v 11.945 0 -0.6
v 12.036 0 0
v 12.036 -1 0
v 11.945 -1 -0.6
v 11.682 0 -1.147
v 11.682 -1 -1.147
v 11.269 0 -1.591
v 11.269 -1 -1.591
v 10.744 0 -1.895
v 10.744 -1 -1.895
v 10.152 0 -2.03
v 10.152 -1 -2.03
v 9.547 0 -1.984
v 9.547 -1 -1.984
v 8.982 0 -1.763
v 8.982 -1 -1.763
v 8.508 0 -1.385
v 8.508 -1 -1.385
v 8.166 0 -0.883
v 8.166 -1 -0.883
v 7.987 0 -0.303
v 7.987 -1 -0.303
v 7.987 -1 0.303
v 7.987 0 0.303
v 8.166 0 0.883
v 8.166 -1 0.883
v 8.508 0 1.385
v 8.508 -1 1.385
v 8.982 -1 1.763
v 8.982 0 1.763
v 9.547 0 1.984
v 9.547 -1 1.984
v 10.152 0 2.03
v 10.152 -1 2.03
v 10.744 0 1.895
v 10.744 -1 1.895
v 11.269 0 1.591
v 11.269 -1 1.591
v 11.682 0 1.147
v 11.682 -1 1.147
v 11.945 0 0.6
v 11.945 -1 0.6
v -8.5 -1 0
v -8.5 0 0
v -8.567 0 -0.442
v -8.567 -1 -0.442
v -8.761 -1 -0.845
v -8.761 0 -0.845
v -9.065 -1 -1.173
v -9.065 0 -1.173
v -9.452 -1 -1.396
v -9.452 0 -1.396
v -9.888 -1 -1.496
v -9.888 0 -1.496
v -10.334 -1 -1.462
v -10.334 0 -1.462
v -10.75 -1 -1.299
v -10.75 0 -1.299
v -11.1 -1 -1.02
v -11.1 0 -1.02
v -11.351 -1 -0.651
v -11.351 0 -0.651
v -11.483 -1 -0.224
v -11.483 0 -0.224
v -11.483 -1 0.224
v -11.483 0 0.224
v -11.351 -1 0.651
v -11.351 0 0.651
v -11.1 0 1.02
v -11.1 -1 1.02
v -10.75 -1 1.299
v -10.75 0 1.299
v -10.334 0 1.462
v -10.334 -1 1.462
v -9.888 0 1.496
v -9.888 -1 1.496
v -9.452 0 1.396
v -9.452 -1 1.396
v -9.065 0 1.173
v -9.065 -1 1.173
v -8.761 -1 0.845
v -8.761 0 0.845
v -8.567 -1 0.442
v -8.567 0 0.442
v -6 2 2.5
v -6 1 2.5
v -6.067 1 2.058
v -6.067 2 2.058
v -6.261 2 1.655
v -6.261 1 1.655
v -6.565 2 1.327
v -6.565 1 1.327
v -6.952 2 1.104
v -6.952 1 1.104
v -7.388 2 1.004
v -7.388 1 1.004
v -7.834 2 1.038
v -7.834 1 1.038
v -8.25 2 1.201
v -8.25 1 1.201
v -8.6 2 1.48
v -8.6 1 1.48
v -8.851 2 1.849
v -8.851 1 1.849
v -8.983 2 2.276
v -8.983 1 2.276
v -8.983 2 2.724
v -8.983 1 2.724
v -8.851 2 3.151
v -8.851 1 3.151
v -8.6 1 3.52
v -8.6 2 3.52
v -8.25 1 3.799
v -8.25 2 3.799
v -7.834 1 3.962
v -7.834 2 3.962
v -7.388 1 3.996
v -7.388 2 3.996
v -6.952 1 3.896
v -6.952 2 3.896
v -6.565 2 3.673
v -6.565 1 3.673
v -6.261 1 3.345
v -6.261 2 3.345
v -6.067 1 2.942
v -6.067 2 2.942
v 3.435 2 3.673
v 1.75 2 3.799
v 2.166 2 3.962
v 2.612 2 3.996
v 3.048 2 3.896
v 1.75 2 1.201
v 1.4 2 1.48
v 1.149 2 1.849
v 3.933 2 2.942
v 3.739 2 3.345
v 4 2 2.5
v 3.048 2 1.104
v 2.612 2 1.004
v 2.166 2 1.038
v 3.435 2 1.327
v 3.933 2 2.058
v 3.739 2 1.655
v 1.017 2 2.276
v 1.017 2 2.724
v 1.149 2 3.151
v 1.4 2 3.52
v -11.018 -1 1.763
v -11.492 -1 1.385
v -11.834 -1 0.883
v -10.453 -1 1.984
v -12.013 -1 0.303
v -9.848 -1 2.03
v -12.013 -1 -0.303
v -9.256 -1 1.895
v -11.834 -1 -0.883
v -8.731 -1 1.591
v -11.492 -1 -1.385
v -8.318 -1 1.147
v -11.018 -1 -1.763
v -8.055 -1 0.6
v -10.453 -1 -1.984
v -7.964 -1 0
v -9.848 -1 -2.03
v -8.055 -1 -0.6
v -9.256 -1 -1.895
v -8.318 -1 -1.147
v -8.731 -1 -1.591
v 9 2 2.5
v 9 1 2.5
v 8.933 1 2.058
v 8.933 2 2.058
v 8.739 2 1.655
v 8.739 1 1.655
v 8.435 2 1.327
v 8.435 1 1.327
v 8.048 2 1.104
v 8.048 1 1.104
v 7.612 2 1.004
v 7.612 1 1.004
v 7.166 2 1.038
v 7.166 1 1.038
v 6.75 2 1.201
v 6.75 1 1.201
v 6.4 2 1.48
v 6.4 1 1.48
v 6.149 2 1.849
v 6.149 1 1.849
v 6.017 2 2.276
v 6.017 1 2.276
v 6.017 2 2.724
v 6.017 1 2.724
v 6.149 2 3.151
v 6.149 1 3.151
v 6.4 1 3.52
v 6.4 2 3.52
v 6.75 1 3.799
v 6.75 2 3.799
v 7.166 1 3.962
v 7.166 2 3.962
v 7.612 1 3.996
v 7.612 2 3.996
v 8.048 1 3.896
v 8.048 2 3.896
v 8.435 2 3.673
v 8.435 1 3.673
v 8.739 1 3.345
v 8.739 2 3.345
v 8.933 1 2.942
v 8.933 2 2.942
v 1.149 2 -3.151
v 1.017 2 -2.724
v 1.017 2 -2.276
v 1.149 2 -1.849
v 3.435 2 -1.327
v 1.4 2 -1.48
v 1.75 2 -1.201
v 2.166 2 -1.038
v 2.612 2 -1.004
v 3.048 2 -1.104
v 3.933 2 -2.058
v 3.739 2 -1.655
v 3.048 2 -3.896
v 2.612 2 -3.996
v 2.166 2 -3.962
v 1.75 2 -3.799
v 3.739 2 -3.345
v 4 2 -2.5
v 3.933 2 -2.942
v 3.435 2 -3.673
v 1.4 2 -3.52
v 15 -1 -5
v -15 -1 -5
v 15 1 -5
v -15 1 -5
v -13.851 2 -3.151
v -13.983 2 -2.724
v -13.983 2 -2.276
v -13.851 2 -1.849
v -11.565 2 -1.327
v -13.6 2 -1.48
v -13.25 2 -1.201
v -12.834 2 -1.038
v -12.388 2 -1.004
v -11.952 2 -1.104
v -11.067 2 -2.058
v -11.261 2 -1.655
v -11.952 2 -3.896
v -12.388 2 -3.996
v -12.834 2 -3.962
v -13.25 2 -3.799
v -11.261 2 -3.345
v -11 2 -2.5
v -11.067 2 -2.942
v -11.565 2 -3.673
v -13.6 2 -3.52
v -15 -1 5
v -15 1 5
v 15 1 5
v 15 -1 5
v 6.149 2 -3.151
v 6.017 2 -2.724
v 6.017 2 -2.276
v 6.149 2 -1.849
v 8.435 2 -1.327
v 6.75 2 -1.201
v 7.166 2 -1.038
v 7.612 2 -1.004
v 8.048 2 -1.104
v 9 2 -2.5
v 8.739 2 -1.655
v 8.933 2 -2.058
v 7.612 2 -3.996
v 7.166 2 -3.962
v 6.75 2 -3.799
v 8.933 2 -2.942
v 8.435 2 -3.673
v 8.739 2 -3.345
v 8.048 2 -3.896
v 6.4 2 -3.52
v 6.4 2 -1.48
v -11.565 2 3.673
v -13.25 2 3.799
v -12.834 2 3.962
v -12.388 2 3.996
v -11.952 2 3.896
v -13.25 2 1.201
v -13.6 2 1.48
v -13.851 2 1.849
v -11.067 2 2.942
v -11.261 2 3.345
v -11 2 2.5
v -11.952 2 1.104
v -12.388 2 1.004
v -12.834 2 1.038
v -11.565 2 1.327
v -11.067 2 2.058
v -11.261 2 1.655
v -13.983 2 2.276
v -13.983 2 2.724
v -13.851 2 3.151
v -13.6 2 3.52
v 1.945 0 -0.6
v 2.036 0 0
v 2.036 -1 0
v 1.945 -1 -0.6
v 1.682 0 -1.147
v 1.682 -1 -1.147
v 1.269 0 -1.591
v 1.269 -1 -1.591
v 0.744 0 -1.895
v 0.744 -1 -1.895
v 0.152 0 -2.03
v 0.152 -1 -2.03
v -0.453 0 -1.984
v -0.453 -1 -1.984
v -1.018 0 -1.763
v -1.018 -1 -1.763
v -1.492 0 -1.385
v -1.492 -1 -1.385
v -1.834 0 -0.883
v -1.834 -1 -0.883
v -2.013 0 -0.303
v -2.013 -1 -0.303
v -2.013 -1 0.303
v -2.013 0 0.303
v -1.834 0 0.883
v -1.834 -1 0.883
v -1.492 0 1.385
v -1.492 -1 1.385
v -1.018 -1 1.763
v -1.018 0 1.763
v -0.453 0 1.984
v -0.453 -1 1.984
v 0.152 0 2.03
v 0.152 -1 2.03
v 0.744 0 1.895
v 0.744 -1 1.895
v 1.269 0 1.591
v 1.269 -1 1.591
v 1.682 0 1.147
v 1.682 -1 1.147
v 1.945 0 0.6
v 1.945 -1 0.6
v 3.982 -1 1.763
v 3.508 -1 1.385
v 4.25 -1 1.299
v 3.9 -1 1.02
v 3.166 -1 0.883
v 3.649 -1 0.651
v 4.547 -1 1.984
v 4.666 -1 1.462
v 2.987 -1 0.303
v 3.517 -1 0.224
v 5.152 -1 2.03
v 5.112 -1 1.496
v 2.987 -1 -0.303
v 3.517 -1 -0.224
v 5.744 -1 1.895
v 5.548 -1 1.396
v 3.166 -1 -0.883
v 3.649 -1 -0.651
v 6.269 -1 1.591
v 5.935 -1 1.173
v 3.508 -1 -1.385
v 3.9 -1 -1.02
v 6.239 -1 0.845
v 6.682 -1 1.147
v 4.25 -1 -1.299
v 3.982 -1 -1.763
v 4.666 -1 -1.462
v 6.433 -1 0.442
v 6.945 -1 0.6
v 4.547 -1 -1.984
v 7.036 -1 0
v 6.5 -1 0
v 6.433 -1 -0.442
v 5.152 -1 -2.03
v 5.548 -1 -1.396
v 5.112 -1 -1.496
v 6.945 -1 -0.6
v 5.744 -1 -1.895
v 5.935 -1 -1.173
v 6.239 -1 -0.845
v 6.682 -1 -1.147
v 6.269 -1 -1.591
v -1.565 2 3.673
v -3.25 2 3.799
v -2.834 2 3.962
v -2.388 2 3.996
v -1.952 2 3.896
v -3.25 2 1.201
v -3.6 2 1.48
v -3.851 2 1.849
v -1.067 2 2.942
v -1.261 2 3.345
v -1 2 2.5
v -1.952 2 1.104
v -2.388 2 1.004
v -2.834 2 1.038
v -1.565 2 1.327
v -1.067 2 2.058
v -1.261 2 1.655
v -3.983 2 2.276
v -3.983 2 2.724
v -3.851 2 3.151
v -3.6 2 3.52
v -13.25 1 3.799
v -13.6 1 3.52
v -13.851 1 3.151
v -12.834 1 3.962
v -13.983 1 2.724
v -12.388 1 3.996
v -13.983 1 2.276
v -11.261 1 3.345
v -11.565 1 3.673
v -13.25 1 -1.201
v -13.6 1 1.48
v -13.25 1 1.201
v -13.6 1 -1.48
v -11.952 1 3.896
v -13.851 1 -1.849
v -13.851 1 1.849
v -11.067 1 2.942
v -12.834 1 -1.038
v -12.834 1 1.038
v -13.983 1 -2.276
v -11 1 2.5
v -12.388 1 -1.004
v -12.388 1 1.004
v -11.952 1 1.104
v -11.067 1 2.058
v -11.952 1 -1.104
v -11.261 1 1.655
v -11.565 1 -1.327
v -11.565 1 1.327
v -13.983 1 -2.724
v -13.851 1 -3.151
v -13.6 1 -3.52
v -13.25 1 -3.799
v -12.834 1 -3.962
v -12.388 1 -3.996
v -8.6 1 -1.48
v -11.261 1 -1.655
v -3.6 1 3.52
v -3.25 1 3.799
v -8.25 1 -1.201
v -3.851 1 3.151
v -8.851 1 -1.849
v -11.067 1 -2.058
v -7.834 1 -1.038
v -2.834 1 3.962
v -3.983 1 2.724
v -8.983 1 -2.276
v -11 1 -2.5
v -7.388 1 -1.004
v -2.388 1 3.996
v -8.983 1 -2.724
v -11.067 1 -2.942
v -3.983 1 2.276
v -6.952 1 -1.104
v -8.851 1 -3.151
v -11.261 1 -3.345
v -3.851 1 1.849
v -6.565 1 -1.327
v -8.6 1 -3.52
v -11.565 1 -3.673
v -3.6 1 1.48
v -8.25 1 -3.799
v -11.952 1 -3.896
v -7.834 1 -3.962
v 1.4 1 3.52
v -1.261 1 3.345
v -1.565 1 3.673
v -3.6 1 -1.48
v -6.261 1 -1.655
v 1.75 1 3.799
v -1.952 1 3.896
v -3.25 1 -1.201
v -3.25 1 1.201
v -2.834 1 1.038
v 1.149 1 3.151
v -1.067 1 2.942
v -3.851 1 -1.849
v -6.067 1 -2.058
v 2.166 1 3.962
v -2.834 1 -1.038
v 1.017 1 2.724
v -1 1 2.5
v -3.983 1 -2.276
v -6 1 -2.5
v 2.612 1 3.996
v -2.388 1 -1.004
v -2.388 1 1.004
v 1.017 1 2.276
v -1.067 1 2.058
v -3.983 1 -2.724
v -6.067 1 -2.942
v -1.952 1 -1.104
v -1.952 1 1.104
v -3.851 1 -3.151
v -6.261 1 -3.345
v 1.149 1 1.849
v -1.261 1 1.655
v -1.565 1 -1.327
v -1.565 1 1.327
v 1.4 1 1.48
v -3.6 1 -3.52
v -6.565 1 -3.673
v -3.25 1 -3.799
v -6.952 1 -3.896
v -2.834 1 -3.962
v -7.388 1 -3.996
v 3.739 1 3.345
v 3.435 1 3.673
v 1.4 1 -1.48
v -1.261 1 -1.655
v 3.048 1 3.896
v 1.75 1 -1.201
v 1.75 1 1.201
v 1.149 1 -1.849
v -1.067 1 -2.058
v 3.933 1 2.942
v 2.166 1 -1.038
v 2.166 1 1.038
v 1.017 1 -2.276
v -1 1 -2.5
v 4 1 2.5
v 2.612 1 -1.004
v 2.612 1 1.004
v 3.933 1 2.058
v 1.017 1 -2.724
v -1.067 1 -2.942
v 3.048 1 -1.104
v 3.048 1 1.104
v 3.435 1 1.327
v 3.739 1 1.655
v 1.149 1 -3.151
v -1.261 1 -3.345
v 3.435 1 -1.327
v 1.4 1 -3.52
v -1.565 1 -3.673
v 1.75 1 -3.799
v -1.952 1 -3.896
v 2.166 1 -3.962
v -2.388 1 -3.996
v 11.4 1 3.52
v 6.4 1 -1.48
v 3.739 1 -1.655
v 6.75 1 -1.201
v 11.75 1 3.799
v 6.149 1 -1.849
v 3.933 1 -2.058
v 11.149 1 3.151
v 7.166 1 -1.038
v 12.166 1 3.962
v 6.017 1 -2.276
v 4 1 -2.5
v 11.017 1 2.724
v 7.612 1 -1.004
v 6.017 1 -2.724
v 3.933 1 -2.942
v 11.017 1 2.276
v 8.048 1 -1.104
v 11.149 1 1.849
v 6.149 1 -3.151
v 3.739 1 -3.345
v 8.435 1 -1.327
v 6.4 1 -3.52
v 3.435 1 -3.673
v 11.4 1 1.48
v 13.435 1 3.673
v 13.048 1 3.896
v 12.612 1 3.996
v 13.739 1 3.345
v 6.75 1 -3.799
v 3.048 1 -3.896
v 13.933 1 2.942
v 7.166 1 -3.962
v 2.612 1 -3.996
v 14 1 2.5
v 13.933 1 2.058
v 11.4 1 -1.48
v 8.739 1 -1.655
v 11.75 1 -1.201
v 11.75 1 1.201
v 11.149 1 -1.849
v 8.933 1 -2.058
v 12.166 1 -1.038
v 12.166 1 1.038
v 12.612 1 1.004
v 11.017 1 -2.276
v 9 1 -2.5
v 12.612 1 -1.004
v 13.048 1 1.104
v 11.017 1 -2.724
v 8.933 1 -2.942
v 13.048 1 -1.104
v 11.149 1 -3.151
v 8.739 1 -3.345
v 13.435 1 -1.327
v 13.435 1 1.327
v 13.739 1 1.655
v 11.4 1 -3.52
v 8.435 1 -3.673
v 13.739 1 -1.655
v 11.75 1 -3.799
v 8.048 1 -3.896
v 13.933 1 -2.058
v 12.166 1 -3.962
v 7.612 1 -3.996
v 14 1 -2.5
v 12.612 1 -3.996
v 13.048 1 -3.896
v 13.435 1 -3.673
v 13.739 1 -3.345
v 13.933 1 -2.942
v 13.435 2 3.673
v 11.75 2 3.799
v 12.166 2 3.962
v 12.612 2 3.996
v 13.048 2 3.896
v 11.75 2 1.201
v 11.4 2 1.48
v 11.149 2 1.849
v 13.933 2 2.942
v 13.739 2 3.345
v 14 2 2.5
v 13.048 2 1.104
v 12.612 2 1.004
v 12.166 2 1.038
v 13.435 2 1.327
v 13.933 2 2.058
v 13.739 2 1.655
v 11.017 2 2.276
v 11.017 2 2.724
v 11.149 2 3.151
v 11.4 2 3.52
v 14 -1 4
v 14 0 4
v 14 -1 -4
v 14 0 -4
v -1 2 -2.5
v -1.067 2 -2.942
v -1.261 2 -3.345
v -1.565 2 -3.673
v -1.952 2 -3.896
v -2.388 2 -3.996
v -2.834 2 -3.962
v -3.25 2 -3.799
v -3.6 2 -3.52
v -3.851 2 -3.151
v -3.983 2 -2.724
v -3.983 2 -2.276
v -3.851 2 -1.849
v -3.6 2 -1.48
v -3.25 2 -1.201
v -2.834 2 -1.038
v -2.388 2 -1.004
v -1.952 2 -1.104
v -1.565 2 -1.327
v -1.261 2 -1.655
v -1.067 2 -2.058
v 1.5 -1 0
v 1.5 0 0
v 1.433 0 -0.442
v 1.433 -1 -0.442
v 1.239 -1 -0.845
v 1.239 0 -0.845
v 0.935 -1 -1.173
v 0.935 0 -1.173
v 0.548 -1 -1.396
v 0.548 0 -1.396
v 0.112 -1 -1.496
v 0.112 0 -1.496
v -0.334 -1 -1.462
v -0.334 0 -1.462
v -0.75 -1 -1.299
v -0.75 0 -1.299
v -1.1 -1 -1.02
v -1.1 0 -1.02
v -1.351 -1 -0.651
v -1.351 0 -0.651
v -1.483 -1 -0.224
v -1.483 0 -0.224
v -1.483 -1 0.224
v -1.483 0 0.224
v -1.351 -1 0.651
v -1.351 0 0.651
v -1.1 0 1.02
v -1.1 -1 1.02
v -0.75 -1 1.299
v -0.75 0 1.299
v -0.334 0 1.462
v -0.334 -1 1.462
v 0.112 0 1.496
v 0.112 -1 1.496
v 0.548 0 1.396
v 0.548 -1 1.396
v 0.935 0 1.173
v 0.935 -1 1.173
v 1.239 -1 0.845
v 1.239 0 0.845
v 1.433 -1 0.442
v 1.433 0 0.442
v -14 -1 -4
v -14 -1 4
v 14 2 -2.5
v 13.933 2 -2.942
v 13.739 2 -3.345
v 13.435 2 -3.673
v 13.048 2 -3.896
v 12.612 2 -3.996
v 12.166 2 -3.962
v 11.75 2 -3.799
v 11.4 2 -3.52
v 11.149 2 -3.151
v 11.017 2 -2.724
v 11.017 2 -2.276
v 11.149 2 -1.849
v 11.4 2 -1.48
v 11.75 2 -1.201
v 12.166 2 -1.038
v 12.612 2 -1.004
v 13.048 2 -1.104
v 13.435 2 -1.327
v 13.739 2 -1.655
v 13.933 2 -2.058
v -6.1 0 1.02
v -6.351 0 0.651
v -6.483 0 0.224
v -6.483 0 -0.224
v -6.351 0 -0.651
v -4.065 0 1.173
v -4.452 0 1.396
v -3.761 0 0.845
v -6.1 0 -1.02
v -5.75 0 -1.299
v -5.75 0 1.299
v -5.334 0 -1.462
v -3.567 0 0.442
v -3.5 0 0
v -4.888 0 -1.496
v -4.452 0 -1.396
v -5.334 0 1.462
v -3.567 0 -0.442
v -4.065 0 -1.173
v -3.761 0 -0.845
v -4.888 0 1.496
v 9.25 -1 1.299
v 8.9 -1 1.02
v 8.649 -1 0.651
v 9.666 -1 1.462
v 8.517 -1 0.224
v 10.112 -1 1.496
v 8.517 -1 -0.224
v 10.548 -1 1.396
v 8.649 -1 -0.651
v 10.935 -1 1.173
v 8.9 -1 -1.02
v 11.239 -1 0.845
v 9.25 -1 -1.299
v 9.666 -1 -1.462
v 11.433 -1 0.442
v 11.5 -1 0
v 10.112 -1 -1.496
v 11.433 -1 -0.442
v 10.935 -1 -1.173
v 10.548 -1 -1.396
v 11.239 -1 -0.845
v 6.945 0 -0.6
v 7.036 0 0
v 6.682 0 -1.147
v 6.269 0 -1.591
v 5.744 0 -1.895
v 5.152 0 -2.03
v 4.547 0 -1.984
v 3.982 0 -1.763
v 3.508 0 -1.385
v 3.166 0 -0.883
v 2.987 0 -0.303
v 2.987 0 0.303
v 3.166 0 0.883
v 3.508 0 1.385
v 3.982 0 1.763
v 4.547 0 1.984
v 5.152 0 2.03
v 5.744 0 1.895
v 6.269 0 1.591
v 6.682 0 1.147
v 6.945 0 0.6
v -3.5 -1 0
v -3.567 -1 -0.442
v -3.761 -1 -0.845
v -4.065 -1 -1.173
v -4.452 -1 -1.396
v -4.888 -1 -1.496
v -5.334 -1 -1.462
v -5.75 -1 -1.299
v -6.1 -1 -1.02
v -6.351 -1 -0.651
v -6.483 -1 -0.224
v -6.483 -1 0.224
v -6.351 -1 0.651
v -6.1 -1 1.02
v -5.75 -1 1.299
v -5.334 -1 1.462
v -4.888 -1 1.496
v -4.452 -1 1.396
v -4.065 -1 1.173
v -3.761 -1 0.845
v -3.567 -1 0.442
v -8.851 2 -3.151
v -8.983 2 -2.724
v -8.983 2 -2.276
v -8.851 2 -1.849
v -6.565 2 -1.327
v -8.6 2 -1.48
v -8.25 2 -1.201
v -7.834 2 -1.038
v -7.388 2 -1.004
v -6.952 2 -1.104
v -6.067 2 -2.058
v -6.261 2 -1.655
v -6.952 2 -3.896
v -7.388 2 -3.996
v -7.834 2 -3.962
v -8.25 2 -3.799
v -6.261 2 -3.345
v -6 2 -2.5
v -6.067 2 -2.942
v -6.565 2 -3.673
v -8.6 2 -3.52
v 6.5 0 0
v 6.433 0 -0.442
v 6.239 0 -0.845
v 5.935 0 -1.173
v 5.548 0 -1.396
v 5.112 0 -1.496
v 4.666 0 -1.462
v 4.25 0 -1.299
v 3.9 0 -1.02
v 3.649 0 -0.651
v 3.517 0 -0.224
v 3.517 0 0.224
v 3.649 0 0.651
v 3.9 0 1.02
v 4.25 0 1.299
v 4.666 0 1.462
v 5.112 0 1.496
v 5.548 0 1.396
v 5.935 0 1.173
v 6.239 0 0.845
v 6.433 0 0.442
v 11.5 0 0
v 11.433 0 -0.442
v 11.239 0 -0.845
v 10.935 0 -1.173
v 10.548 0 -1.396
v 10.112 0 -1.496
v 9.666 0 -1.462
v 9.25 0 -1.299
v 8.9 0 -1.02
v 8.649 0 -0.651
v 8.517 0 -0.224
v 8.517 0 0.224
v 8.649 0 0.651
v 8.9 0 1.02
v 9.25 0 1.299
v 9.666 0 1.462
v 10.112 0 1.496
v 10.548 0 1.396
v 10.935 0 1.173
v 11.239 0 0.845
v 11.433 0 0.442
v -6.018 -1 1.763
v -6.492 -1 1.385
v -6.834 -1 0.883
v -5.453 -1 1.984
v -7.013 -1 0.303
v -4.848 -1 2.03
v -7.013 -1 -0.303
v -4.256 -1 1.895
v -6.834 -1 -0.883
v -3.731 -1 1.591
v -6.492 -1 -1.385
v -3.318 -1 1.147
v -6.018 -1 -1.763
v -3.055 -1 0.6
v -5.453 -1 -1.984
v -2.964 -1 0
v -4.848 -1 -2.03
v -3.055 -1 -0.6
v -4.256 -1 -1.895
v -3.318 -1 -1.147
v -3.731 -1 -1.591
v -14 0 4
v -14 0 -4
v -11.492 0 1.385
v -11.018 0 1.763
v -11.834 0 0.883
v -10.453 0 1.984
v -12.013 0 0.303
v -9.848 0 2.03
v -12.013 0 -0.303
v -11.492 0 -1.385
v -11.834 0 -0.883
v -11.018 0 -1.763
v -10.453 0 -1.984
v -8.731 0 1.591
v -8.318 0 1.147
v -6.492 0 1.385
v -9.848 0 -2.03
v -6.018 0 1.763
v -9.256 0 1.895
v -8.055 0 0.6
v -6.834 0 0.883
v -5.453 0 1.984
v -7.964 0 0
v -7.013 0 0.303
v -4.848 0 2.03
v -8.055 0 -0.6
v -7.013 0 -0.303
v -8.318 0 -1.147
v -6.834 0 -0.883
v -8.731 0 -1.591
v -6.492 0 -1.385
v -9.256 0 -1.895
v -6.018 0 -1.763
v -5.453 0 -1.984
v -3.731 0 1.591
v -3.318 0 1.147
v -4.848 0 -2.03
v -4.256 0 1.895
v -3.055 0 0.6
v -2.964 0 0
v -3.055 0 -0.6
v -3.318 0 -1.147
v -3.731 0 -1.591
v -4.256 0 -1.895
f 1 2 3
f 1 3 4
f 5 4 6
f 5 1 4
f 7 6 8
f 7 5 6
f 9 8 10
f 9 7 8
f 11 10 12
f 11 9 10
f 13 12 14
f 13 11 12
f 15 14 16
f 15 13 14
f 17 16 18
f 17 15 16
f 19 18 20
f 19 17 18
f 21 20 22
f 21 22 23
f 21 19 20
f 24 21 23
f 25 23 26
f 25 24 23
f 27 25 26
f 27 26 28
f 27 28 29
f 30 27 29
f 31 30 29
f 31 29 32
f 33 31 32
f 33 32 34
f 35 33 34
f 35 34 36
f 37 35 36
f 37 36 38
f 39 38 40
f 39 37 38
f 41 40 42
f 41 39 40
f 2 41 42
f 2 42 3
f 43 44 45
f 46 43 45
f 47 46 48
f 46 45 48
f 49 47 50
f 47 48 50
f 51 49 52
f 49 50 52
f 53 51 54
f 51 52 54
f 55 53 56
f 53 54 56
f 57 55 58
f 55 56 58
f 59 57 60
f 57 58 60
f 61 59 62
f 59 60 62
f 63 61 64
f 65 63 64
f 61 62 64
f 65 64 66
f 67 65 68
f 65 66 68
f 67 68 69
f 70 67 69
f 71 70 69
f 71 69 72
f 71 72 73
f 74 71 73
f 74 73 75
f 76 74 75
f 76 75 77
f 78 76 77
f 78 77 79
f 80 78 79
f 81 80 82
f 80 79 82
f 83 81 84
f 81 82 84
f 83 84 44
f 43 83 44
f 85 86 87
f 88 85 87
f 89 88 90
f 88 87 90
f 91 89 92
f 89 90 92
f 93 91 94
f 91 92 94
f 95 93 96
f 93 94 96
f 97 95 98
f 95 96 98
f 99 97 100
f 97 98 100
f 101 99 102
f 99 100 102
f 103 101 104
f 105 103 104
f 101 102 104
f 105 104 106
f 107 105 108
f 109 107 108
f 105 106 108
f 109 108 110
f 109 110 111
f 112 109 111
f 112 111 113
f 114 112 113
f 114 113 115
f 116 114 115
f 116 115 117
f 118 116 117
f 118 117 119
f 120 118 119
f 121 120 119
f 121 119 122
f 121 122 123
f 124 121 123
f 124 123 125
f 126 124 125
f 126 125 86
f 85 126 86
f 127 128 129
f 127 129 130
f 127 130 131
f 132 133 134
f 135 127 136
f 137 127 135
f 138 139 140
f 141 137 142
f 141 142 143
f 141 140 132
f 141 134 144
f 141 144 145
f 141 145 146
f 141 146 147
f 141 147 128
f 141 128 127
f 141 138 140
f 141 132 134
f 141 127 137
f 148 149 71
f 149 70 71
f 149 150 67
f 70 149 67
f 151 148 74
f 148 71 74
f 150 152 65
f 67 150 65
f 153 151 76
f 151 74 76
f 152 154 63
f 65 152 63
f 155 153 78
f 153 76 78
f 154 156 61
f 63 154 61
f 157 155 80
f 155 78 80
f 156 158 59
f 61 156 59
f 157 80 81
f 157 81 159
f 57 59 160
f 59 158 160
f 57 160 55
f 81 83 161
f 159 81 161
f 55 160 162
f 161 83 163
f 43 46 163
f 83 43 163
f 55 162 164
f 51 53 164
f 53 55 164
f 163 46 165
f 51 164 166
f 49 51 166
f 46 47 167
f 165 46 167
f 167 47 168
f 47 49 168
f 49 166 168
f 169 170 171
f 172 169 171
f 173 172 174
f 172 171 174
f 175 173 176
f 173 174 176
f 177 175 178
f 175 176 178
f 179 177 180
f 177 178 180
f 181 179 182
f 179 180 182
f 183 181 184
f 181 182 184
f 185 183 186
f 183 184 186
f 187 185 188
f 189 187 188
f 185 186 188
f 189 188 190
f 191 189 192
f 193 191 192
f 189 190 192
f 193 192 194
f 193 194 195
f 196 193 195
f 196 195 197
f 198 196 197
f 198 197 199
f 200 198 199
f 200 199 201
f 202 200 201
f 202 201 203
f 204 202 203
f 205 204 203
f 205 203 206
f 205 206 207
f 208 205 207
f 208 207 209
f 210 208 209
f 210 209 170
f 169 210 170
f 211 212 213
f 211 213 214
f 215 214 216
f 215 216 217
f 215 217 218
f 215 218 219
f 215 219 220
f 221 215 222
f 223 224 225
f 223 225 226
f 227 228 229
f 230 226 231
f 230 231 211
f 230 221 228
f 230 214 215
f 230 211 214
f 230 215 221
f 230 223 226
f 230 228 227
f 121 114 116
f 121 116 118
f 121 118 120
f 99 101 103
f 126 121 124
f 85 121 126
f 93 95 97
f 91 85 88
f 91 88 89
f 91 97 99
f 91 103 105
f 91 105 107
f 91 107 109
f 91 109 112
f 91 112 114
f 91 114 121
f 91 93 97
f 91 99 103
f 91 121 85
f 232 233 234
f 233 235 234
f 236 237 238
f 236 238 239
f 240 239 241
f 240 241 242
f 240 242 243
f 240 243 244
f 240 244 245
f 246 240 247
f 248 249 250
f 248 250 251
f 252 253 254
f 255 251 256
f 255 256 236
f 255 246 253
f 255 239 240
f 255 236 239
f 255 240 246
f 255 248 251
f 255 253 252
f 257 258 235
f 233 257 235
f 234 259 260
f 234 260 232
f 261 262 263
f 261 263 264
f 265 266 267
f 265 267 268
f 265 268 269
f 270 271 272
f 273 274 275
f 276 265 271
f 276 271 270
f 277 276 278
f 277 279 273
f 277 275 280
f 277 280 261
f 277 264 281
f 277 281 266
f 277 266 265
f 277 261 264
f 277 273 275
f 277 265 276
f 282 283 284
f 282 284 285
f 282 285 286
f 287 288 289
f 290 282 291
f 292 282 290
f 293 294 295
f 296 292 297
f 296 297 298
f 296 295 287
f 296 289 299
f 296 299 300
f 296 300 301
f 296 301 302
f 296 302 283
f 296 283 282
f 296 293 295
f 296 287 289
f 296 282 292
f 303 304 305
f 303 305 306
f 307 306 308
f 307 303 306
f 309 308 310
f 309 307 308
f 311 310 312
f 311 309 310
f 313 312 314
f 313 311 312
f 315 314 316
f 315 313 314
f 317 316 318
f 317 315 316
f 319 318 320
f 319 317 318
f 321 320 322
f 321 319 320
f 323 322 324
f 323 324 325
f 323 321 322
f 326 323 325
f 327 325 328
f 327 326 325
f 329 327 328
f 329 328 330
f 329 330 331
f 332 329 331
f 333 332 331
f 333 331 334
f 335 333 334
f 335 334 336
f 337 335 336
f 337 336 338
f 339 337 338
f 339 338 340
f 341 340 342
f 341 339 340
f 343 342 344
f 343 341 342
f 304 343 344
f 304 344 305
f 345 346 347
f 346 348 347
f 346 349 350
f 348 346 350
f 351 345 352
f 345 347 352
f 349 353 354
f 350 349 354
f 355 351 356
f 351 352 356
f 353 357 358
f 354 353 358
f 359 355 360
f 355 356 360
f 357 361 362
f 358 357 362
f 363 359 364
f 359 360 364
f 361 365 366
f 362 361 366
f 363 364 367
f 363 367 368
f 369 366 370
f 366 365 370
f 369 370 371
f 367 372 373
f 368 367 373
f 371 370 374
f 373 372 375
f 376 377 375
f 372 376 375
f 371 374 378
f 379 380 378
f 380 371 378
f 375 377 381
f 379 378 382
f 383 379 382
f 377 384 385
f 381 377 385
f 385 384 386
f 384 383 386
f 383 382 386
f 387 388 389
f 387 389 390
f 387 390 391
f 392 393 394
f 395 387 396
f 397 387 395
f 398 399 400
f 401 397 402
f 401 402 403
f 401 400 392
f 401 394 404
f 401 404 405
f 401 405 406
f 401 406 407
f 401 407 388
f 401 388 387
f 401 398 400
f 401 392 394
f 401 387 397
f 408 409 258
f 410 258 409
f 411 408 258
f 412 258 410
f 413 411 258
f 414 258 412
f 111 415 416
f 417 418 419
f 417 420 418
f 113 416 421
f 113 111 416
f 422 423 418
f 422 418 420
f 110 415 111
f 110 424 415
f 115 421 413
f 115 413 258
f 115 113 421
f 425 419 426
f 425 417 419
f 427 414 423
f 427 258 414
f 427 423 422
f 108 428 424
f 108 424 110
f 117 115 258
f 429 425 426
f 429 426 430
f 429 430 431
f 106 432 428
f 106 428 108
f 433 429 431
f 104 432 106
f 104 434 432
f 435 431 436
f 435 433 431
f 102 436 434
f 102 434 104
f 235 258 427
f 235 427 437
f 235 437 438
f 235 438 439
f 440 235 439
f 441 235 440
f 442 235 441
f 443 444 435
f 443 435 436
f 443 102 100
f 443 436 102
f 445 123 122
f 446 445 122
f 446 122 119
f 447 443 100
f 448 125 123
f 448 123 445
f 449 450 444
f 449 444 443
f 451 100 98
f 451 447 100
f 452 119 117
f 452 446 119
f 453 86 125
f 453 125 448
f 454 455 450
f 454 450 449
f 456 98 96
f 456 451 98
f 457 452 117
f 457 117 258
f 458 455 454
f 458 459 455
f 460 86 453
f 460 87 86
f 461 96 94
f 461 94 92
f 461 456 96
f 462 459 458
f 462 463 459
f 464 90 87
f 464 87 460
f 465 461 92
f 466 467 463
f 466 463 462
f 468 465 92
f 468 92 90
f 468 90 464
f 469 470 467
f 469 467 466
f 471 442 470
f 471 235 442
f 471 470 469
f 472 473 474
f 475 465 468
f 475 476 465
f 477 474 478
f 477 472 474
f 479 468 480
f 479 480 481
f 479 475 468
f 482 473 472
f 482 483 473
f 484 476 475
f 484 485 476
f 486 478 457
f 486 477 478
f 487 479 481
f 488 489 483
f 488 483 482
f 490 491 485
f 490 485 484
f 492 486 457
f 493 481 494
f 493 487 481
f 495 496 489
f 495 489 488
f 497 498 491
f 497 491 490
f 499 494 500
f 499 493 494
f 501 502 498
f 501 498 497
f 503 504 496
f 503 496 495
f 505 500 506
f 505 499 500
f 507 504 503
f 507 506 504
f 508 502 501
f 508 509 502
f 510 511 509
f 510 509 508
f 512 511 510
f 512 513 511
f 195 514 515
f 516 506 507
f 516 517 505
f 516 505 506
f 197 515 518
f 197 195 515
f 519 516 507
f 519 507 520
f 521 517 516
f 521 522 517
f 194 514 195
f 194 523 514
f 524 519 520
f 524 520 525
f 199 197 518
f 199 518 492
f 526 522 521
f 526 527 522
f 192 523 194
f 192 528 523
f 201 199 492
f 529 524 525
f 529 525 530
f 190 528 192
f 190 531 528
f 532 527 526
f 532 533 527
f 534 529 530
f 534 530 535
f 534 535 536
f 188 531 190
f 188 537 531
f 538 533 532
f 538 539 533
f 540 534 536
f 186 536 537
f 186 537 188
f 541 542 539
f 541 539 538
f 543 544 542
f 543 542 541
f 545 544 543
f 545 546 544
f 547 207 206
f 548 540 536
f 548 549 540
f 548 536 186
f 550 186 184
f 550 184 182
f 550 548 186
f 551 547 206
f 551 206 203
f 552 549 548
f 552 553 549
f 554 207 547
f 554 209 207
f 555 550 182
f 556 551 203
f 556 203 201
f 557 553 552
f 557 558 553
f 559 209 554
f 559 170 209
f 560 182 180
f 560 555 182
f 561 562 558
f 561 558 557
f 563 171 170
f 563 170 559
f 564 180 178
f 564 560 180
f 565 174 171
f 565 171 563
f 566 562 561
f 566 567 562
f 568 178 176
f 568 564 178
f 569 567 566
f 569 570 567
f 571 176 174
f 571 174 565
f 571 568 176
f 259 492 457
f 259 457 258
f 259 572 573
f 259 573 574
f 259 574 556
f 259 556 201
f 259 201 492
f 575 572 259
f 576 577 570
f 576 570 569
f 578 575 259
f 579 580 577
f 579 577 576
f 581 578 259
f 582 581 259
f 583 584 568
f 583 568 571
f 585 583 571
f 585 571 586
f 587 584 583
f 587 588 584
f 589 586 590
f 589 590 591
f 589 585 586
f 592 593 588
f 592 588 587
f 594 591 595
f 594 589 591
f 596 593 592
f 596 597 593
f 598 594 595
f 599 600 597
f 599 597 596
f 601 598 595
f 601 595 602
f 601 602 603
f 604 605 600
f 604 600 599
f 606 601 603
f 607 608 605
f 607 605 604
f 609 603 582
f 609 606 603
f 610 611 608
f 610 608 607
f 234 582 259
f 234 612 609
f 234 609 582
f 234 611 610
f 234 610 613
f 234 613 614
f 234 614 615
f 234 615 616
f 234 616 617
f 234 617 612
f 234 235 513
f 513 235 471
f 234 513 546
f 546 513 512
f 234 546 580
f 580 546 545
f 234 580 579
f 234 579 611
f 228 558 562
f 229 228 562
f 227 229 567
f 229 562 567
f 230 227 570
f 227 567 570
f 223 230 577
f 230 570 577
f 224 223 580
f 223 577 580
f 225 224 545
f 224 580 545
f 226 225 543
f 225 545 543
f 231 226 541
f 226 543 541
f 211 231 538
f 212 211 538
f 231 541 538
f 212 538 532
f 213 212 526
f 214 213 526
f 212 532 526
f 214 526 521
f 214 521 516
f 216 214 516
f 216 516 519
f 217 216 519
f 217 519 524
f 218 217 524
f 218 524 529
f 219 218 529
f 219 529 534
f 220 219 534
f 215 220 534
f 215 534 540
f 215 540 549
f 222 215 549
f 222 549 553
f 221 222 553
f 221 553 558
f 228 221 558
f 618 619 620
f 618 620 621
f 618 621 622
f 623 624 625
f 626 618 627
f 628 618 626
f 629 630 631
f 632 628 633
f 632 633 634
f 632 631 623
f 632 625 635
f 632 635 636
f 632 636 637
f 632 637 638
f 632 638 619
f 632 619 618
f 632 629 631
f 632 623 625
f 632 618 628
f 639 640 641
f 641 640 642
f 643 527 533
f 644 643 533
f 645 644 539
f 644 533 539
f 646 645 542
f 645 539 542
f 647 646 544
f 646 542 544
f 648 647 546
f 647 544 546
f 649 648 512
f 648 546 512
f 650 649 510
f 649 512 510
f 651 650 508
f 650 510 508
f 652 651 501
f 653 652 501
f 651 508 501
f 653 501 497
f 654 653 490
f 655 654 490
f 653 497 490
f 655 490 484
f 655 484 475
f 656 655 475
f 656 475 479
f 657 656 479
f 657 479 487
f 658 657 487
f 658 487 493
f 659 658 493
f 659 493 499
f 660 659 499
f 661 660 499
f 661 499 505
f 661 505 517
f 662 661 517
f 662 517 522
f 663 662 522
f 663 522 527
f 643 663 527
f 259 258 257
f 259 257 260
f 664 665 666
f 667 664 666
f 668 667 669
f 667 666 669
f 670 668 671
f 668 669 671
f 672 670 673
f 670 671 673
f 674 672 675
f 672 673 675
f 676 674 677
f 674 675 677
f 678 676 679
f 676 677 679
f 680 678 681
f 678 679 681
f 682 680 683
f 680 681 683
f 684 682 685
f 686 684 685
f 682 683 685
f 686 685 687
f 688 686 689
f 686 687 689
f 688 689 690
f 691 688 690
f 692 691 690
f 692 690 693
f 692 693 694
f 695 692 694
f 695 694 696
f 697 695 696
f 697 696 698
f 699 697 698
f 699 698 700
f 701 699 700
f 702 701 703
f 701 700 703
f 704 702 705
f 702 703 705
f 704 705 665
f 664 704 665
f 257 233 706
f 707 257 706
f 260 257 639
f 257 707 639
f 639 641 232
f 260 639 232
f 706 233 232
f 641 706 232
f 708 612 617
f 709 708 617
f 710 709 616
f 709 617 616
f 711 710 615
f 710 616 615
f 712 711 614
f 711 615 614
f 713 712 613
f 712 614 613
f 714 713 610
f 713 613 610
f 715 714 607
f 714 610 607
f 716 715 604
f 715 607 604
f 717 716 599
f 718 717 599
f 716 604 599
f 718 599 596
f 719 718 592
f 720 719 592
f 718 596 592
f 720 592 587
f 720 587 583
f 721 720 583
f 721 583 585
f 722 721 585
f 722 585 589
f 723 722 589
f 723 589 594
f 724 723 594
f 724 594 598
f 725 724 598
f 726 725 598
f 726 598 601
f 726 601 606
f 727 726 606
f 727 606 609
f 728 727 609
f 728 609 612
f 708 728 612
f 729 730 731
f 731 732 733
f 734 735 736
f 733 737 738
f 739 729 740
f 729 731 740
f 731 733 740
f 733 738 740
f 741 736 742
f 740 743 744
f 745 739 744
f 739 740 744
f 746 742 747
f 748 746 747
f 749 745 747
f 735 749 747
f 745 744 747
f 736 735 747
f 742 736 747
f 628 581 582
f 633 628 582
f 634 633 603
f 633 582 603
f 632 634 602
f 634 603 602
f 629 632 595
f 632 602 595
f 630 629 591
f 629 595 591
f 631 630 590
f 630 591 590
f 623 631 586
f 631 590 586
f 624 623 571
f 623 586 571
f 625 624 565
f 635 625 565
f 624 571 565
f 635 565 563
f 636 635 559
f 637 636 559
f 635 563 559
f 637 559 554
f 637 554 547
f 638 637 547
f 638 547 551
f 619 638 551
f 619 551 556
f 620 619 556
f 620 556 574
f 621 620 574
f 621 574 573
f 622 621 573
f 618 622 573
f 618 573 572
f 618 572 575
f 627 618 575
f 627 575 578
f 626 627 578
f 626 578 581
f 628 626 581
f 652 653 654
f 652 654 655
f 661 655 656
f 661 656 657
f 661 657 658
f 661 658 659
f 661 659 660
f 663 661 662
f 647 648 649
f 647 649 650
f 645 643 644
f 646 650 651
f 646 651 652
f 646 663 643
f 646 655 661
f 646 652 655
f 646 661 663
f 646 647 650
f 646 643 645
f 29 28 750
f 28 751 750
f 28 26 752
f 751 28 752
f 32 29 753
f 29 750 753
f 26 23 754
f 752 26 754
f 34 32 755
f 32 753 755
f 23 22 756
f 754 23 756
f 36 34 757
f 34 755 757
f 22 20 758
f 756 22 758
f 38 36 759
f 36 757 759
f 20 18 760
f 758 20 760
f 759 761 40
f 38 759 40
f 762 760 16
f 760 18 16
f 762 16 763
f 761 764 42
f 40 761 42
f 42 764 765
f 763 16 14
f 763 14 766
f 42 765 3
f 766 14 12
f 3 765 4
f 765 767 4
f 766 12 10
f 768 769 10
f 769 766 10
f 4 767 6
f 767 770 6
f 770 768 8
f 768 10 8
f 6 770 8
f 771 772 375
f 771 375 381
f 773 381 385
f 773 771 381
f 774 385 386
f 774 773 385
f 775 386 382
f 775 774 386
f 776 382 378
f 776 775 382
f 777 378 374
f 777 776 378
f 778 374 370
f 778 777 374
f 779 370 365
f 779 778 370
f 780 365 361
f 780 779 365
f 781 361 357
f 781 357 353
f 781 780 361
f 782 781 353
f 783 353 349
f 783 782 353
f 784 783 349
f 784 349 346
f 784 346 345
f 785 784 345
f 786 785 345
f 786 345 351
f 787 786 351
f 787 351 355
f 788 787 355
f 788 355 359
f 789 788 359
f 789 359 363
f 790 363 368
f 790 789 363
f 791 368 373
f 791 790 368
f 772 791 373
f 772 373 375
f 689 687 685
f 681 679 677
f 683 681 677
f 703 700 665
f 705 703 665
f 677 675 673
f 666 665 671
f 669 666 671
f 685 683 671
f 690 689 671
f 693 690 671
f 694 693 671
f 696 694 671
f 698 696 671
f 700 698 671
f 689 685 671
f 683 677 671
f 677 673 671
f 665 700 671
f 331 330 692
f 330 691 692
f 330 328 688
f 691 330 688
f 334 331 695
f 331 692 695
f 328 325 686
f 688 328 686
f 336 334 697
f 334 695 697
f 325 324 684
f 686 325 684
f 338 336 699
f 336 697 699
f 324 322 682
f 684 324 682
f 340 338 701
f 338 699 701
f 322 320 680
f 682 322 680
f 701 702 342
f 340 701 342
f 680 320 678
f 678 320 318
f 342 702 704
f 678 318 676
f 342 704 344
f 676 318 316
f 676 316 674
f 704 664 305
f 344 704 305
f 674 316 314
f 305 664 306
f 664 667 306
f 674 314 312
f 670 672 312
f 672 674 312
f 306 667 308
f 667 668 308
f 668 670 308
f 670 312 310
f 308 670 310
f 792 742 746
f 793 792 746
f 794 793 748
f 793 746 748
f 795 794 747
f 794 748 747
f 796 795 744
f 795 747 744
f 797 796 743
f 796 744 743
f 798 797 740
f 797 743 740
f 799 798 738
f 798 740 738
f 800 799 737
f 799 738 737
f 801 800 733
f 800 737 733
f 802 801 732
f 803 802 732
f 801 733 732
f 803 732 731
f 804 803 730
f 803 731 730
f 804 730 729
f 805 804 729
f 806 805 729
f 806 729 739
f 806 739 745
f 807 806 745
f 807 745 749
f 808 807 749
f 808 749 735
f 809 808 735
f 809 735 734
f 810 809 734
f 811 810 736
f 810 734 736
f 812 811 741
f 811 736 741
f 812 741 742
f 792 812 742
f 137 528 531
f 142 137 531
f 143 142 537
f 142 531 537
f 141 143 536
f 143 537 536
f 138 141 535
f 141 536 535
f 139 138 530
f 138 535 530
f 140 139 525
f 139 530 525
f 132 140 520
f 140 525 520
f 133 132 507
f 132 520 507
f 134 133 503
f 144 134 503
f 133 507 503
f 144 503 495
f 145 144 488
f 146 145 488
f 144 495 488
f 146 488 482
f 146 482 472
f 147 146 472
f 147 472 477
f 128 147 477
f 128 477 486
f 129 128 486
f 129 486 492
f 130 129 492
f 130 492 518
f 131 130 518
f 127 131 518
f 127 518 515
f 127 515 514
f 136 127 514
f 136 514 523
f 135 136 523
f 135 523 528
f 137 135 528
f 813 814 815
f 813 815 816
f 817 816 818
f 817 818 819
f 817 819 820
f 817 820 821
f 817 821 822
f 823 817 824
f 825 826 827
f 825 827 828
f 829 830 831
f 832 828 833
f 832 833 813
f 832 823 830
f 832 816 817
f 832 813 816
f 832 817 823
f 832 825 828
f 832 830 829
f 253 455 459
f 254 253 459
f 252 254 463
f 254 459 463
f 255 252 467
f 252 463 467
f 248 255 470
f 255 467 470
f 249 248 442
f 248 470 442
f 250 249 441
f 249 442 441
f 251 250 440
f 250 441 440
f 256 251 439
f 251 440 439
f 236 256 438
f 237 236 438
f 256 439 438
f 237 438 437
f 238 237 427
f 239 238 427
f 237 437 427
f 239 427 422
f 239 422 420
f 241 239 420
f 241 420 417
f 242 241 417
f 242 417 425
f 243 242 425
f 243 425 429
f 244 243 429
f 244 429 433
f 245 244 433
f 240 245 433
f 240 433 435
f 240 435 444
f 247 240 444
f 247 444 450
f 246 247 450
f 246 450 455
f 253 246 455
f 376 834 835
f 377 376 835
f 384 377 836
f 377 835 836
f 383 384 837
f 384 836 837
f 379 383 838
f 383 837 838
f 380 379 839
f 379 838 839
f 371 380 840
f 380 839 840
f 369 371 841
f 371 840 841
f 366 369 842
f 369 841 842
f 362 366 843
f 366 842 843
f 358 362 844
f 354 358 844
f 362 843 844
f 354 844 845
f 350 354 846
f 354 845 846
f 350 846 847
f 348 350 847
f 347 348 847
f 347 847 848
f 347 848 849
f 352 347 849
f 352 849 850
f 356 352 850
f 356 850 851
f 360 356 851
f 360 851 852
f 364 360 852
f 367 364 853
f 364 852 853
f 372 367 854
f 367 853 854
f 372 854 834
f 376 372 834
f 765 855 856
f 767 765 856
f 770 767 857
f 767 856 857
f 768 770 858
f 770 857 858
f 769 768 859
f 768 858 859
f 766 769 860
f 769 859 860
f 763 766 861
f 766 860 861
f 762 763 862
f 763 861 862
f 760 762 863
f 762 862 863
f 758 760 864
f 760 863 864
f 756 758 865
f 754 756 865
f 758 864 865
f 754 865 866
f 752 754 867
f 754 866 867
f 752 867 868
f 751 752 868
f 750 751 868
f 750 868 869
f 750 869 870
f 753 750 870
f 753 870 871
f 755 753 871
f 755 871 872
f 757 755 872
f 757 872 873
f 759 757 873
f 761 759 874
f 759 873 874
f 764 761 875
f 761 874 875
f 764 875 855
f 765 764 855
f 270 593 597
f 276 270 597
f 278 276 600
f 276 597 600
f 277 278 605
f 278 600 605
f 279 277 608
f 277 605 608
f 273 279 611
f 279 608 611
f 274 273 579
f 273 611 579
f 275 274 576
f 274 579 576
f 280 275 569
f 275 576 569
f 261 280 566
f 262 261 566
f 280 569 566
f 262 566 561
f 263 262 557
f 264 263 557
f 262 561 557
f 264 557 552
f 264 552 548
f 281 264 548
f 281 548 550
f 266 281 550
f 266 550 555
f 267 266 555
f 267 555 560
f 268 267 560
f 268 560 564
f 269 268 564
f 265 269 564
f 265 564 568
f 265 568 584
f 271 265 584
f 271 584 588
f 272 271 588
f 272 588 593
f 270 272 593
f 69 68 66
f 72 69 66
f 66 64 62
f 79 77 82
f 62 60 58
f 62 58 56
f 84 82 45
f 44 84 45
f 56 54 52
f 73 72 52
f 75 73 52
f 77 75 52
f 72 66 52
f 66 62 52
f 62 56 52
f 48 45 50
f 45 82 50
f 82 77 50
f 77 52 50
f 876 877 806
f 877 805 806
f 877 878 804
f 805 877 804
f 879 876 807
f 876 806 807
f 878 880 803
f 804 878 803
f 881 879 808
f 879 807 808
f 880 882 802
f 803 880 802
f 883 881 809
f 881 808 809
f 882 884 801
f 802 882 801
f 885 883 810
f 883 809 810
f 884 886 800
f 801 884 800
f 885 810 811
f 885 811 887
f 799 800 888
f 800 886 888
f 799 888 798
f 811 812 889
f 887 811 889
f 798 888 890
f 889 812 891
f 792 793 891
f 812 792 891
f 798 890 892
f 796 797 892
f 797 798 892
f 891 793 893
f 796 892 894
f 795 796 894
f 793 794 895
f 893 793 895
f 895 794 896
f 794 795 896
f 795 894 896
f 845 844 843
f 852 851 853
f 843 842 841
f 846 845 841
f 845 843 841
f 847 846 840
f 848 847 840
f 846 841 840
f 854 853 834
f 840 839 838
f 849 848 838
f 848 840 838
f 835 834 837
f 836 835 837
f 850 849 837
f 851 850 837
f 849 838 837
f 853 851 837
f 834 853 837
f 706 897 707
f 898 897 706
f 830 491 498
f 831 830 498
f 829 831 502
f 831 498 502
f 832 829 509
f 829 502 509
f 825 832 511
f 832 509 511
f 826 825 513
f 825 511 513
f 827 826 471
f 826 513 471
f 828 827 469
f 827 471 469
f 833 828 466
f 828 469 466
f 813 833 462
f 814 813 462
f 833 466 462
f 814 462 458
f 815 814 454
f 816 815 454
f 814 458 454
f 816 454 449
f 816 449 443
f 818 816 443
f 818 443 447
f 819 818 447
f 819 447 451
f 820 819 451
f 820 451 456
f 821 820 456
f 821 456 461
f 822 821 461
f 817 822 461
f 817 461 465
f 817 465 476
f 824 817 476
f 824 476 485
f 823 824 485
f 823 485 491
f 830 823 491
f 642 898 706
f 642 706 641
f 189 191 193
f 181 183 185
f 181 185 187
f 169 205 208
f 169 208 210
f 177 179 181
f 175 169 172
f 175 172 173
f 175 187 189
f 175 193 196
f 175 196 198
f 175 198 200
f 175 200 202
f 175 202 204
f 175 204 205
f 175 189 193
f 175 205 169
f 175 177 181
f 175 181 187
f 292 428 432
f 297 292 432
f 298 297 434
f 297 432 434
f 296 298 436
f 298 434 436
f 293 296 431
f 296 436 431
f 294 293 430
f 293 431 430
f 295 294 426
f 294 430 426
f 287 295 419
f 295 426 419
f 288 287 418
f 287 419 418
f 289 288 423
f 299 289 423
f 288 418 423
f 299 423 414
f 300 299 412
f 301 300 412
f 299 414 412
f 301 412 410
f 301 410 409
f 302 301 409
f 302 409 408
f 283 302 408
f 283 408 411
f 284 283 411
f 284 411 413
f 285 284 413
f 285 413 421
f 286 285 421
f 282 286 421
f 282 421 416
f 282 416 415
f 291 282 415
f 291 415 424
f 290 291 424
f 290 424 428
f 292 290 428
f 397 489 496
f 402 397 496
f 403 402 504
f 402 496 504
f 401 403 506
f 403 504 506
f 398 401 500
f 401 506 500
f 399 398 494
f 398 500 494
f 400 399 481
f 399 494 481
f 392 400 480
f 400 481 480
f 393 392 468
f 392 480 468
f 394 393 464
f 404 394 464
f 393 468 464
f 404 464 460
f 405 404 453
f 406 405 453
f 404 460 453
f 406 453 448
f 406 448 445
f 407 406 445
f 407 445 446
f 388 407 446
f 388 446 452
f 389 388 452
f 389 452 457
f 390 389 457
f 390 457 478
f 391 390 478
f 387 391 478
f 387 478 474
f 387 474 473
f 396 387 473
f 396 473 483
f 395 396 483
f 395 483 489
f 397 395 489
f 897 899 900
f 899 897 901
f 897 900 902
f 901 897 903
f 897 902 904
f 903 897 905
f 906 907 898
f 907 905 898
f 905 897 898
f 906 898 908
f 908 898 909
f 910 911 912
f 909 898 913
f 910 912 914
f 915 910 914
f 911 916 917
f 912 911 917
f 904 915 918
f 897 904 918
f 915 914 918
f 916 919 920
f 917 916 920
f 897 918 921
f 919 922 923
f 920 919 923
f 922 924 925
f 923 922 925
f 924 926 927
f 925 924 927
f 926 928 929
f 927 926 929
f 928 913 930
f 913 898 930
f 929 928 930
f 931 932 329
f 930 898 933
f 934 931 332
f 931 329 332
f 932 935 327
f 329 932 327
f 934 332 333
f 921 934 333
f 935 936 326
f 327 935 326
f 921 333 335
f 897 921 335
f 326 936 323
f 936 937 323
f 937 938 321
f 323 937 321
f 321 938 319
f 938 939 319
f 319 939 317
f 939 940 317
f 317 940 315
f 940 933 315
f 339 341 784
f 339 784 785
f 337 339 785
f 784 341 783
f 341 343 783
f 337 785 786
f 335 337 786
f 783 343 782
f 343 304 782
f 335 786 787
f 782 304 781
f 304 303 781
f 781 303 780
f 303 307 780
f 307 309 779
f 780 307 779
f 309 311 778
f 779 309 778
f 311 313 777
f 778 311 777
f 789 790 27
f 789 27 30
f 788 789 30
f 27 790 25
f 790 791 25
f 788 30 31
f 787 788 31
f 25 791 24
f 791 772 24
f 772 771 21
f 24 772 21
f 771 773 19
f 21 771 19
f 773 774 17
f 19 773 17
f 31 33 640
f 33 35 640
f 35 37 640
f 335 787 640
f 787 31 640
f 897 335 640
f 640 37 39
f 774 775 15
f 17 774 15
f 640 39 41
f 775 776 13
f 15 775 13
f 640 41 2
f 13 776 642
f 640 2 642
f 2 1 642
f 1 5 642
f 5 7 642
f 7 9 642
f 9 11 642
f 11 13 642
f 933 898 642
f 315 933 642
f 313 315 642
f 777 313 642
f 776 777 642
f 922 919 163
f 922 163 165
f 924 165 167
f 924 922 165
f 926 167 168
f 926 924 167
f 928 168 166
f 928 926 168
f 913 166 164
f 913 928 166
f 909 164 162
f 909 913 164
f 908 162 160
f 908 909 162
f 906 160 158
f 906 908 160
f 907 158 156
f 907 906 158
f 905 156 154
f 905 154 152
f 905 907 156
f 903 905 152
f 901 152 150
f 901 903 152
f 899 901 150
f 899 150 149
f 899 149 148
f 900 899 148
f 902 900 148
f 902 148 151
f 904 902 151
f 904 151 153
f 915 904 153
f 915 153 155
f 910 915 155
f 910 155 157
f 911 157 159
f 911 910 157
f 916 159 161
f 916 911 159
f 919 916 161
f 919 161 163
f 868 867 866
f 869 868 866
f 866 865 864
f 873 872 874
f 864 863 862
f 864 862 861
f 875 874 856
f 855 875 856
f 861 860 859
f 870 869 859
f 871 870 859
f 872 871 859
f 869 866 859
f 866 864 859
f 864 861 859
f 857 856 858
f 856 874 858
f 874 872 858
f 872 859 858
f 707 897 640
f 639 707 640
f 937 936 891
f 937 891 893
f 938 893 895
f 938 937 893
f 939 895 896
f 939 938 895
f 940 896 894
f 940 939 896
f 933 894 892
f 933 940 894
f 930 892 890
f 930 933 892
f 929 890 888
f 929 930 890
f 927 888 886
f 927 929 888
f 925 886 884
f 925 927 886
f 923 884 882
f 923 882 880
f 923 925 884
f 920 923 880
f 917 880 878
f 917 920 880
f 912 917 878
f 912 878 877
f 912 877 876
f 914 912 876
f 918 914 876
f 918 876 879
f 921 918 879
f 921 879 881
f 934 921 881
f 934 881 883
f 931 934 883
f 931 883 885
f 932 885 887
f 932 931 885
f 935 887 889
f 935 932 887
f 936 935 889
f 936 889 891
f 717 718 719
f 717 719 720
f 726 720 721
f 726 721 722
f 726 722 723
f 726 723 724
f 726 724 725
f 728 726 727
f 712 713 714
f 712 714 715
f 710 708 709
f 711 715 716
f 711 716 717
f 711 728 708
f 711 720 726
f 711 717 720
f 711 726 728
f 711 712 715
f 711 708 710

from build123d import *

# Parameters (mm, degrees)
SKETCH1_R              = 1.5
BOSS_EXTRUDE1_DEPTH    = 2
BOSS_EXTRUDE1_2_DEPTH  = 2
BOSS_EXTRUDE1_3_DEPTH  = 2
BOSS_EXTRUDE1_4_DEPTH  = 2
BOSS_EXTRUDE1_5_DEPTH  = 2
BOSS_EXTRUDE1_6_DEPTH  = 2
BOSS_EXTRUDE1_7_DEPTH  = 2
BOSS_EXTRUDE1_8_DEPTH  = 2
BOSS_EXTRUDE1_9_DEPTH  = 2
BOSS_EXTRUDE1_10_DEPTH = 2
BOSS_EXTRUDE1_11_DEPTH = 2
BOSS_EXTRUDE1_12_DEPTH = 2
SKETCH1_3_W            = 30
SKETCH1_3_H            = 10
BOSS_EXTRUDE2_DEPTH    = 1
SKETCH1_4_W            = 30
SKETCH1_4_H            = 10
SKETCH1_4_W_2          = 28
SKETCH1_4_H_2          = 8
SKETCH1_4_R            = 2.035533906
SKETCH1_4_R_2          = 1.5
BOSS_EXTRUDE3_DEPTH    = 1


with BuildPart() as part:
    # Sketch1 → Boss-Extrude1 (new body)
    with BuildSketch(Plane(origin=(0, 0, 0), x_dir=(1, 0, 0), z_dir=(0, 1, 0))):
        with Locations((-12.5, 2.5)):
            Circle(SKETCH1_R)
    extrude(amount=BOSS_EXTRUDE1_DEPTH)



with BuildPart() as body_2:
    # Sketch1 → Boss-Extrude1 2 (new body)
    with BuildSketch(Plane(origin=(0, 0, 0), x_dir=(1, 0, 0), z_dir=(0, 1, 0))):
        with Locations((-7.5, 2.5)):
            Circle(SKETCH1_R)
    extrude(amount=BOSS_EXTRUDE1_2_DEPTH)


with BuildPart() as body_3:
    # Sketch1 → Boss-Extrude1 3 (new body)
    with BuildSketch(Plane(origin=(0, 0, 0), x_dir=(1, 0, 0), z_dir=(0, 1, 0))):
        with Locations((-12.5, -2.5)):
            Circle(SKETCH1_R)
    extrude(amount=BOSS_EXTRUDE1_3_DEPTH)


with BuildPart() as body_4:
    # Sketch1 → Boss-Extrude1 4 (new body)
    with BuildSketch(Plane(origin=(0, 0, 0), x_dir=(1, 0, 0), z_dir=(0, 1, 0))):
        with Locations((-2.5, 2.5)):
            Circle(SKETCH1_R)
    extrude(amount=BOSS_EXTRUDE1_4_DEPTH)


with BuildPart() as body_5:
    # Sketch1 → Boss-Extrude1 5 (new body)
    with BuildSketch(Plane(origin=(0, 0, 0), x_dir=(1, 0, 0), z_dir=(0, 1, 0))):
        with Locations((2.5, 2.5)):
            Circle(SKETCH1_R)
    extrude(amount=BOSS_EXTRUDE1_5_DEPTH)


with BuildPart() as body_6:
    # Sketch1 → Boss-Extrude1 6 (new body)
    with BuildSketch(Plane(origin=(0, 0, 0), x_dir=(1, 0, 0), z_dir=(0, 1, 0))):
        with Locations((-7.5, -2.5)):
            Circle(SKETCH1_R)
    extrude(amount=BOSS_EXTRUDE1_6_DEPTH)


with BuildPart() as body_7:
    # Sketch1 → Boss-Extrude1 7 (new body)
    with BuildSketch(Plane(origin=(0, 0, 0), x_dir=(1, 0, 0), z_dir=(0, 1, 0))):
        with Locations((7.5, 2.5)):
            Circle(SKETCH1_R)
    extrude(amount=BOSS_EXTRUDE1_7_DEPTH)


with BuildPart() as body_8:
    # Sketch1 → Boss-Extrude1 8 (new body)
    with BuildSketch(Plane(origin=(0, 0, 0), x_dir=(1, 0, 0), z_dir=(0, 1, 0))):
        with Locations((-2.5, -2.5)):
            Circle(SKETCH1_R)
    extrude(amount=BOSS_EXTRUDE1_8_DEPTH)


with BuildPart() as body_9:
    # Sketch1 → Boss-Extrude1 9 (new body)
    with BuildSketch(Plane(origin=(0, 0, 0), x_dir=(1, 0, 0), z_dir=(0, 1, 0))):
        with Locations((12.5, 2.5)):
            Circle(SKETCH1_R)
    extrude(amount=BOSS_EXTRUDE1_9_DEPTH)


with BuildPart() as body_10:
    # Sketch1 → Boss-Extrude1 10 (new body)
    with BuildSketch(Plane(origin=(0, 0, 0), x_dir=(1, 0, 0), z_dir=(0, 1, 0))):
        with Locations((2.5, -2.5)):
            Circle(SKETCH1_R)
    extrude(amount=BOSS_EXTRUDE1_10_DEPTH)


with BuildPart() as body_11:
    # Sketch1 → Boss-Extrude1 11 (new body)
    with BuildSketch(Plane(origin=(0, 0, 0), x_dir=(1, 0, 0), z_dir=(0, 1, 0))):
        with Locations((7.5, -2.5)):
            Circle(SKETCH1_R)
    extrude(amount=BOSS_EXTRUDE1_11_DEPTH)


with BuildPart() as body_12:
    # Sketch1 → Boss-Extrude1 12 (new body)
    with BuildSketch(Plane(origin=(0, 0, 0), x_dir=(1, 0, 0), z_dir=(0, 1, 0))):
        with Locations((12.5, -2.5)):
            Circle(SKETCH1_R)
    extrude(amount=BOSS_EXTRUDE1_12_DEPTH)


with BuildPart() as part_1:
    add(part.part)

    add(body_2.part)  # Boss-Extrude2 merges body 2

    add(body_3.part)  # Boss-Extrude2 merges body 3

    add(body_4.part)  # Boss-Extrude2 merges body 4

    add(body_5.part)  # Boss-Extrude2 merges body 5

    add(body_6.part)  # Boss-Extrude2 merges body 6

    add(body_7.part)  # Boss-Extrude2 merges body 7

    add(body_8.part)  # Boss-Extrude2 merges body 8

    add(body_9.part)  # Boss-Extrude2 merges body 9

    add(body_10.part)  # Boss-Extrude2 merges body 10

    add(body_11.part)  # Boss-Extrude2 merges body 11

    add(body_12.part)  # Boss-Extrude2 merges body 12
    # Sketch1<3> → Boss-Extrude2 (add)
    with BuildSketch(Plane(origin=(0, 0, 0), x_dir=(1, 0, 0), z_dir=(0, 1, 0))):
        Rectangle(SKETCH1_3_W, SKETCH1_3_H)
    extrude(amount=BOSS_EXTRUDE2_DEPTH)

    # Sketch1<4> → Boss-Extrude3 (add)
    # profile 1 of 6: a face of its own
    with BuildSketch(Plane(origin=(0, 0, 0), x_dir=(1, 0, 0), z_dir=(0, 1, 0))):
        Rectangle(SKETCH1_4_W, SKETCH1_4_H)
        Rectangle(SKETCH1_4_W_2, SKETCH1_4_H_2, mode=Mode.SUBTRACT)
    # profile 2 of 6: a face of its own
    with BuildSketch(Plane(origin=(0, 0, 0), x_dir=(1, 0, 0), z_dir=(0, 1, 0))):
        with Locations((-10, 0)):
            Circle(SKETCH1_4_R)
        with Locations((-10, 0)):
            Circle(SKETCH1_4_R_2, mode=Mode.SUBTRACT)
    # profile 3 of 6: a face of its own
    with BuildSketch(Plane(origin=(0, 0, 0), x_dir=(1, 0, 0), z_dir=(0, 1, 0))):
        with Locations((-5, 0)):
            Circle(SKETCH1_4_R)
        with Locations((-5, 0)):
            Circle(SKETCH1_4_R_2, mode=Mode.SUBTRACT)
    # profile 4 of 6: a face of its own
    with BuildSketch(Plane(origin=(0, 0, 0), x_dir=(1, 0, 0), z_dir=(0, 1, 0))):
        Circle(SKETCH1_4_R)
        Circle(SKETCH1_4_R_2, mode=Mode.SUBTRACT)
    # profile 5 of 6: a face of its own
    with BuildSketch(Plane(origin=(0, 0, 0), x_dir=(1, 0, 0), z_dir=(0, 1, 0))):
        with Locations((5, 0)):
            Circle(SKETCH1_4_R)
        with Locations((5, 0)):
            Circle(SKETCH1_4_R_2, mode=Mode.SUBTRACT)
    # profile 6 of 6: a face of its own
    with BuildSketch(Plane(origin=(0, 0, 0), x_dir=(1, 0, 0), z_dir=(0, 1, 0))):
        with Locations((10, 0)):
            Circle(SKETCH1_4_R)
        with Locations((10, 0)):
            Circle(SKETCH1_4_R_2, mode=Mode.SUBTRACT)
    extrude(amount=-BOSS_EXTRUDE3_DEPTH)


solid = part_1.part
